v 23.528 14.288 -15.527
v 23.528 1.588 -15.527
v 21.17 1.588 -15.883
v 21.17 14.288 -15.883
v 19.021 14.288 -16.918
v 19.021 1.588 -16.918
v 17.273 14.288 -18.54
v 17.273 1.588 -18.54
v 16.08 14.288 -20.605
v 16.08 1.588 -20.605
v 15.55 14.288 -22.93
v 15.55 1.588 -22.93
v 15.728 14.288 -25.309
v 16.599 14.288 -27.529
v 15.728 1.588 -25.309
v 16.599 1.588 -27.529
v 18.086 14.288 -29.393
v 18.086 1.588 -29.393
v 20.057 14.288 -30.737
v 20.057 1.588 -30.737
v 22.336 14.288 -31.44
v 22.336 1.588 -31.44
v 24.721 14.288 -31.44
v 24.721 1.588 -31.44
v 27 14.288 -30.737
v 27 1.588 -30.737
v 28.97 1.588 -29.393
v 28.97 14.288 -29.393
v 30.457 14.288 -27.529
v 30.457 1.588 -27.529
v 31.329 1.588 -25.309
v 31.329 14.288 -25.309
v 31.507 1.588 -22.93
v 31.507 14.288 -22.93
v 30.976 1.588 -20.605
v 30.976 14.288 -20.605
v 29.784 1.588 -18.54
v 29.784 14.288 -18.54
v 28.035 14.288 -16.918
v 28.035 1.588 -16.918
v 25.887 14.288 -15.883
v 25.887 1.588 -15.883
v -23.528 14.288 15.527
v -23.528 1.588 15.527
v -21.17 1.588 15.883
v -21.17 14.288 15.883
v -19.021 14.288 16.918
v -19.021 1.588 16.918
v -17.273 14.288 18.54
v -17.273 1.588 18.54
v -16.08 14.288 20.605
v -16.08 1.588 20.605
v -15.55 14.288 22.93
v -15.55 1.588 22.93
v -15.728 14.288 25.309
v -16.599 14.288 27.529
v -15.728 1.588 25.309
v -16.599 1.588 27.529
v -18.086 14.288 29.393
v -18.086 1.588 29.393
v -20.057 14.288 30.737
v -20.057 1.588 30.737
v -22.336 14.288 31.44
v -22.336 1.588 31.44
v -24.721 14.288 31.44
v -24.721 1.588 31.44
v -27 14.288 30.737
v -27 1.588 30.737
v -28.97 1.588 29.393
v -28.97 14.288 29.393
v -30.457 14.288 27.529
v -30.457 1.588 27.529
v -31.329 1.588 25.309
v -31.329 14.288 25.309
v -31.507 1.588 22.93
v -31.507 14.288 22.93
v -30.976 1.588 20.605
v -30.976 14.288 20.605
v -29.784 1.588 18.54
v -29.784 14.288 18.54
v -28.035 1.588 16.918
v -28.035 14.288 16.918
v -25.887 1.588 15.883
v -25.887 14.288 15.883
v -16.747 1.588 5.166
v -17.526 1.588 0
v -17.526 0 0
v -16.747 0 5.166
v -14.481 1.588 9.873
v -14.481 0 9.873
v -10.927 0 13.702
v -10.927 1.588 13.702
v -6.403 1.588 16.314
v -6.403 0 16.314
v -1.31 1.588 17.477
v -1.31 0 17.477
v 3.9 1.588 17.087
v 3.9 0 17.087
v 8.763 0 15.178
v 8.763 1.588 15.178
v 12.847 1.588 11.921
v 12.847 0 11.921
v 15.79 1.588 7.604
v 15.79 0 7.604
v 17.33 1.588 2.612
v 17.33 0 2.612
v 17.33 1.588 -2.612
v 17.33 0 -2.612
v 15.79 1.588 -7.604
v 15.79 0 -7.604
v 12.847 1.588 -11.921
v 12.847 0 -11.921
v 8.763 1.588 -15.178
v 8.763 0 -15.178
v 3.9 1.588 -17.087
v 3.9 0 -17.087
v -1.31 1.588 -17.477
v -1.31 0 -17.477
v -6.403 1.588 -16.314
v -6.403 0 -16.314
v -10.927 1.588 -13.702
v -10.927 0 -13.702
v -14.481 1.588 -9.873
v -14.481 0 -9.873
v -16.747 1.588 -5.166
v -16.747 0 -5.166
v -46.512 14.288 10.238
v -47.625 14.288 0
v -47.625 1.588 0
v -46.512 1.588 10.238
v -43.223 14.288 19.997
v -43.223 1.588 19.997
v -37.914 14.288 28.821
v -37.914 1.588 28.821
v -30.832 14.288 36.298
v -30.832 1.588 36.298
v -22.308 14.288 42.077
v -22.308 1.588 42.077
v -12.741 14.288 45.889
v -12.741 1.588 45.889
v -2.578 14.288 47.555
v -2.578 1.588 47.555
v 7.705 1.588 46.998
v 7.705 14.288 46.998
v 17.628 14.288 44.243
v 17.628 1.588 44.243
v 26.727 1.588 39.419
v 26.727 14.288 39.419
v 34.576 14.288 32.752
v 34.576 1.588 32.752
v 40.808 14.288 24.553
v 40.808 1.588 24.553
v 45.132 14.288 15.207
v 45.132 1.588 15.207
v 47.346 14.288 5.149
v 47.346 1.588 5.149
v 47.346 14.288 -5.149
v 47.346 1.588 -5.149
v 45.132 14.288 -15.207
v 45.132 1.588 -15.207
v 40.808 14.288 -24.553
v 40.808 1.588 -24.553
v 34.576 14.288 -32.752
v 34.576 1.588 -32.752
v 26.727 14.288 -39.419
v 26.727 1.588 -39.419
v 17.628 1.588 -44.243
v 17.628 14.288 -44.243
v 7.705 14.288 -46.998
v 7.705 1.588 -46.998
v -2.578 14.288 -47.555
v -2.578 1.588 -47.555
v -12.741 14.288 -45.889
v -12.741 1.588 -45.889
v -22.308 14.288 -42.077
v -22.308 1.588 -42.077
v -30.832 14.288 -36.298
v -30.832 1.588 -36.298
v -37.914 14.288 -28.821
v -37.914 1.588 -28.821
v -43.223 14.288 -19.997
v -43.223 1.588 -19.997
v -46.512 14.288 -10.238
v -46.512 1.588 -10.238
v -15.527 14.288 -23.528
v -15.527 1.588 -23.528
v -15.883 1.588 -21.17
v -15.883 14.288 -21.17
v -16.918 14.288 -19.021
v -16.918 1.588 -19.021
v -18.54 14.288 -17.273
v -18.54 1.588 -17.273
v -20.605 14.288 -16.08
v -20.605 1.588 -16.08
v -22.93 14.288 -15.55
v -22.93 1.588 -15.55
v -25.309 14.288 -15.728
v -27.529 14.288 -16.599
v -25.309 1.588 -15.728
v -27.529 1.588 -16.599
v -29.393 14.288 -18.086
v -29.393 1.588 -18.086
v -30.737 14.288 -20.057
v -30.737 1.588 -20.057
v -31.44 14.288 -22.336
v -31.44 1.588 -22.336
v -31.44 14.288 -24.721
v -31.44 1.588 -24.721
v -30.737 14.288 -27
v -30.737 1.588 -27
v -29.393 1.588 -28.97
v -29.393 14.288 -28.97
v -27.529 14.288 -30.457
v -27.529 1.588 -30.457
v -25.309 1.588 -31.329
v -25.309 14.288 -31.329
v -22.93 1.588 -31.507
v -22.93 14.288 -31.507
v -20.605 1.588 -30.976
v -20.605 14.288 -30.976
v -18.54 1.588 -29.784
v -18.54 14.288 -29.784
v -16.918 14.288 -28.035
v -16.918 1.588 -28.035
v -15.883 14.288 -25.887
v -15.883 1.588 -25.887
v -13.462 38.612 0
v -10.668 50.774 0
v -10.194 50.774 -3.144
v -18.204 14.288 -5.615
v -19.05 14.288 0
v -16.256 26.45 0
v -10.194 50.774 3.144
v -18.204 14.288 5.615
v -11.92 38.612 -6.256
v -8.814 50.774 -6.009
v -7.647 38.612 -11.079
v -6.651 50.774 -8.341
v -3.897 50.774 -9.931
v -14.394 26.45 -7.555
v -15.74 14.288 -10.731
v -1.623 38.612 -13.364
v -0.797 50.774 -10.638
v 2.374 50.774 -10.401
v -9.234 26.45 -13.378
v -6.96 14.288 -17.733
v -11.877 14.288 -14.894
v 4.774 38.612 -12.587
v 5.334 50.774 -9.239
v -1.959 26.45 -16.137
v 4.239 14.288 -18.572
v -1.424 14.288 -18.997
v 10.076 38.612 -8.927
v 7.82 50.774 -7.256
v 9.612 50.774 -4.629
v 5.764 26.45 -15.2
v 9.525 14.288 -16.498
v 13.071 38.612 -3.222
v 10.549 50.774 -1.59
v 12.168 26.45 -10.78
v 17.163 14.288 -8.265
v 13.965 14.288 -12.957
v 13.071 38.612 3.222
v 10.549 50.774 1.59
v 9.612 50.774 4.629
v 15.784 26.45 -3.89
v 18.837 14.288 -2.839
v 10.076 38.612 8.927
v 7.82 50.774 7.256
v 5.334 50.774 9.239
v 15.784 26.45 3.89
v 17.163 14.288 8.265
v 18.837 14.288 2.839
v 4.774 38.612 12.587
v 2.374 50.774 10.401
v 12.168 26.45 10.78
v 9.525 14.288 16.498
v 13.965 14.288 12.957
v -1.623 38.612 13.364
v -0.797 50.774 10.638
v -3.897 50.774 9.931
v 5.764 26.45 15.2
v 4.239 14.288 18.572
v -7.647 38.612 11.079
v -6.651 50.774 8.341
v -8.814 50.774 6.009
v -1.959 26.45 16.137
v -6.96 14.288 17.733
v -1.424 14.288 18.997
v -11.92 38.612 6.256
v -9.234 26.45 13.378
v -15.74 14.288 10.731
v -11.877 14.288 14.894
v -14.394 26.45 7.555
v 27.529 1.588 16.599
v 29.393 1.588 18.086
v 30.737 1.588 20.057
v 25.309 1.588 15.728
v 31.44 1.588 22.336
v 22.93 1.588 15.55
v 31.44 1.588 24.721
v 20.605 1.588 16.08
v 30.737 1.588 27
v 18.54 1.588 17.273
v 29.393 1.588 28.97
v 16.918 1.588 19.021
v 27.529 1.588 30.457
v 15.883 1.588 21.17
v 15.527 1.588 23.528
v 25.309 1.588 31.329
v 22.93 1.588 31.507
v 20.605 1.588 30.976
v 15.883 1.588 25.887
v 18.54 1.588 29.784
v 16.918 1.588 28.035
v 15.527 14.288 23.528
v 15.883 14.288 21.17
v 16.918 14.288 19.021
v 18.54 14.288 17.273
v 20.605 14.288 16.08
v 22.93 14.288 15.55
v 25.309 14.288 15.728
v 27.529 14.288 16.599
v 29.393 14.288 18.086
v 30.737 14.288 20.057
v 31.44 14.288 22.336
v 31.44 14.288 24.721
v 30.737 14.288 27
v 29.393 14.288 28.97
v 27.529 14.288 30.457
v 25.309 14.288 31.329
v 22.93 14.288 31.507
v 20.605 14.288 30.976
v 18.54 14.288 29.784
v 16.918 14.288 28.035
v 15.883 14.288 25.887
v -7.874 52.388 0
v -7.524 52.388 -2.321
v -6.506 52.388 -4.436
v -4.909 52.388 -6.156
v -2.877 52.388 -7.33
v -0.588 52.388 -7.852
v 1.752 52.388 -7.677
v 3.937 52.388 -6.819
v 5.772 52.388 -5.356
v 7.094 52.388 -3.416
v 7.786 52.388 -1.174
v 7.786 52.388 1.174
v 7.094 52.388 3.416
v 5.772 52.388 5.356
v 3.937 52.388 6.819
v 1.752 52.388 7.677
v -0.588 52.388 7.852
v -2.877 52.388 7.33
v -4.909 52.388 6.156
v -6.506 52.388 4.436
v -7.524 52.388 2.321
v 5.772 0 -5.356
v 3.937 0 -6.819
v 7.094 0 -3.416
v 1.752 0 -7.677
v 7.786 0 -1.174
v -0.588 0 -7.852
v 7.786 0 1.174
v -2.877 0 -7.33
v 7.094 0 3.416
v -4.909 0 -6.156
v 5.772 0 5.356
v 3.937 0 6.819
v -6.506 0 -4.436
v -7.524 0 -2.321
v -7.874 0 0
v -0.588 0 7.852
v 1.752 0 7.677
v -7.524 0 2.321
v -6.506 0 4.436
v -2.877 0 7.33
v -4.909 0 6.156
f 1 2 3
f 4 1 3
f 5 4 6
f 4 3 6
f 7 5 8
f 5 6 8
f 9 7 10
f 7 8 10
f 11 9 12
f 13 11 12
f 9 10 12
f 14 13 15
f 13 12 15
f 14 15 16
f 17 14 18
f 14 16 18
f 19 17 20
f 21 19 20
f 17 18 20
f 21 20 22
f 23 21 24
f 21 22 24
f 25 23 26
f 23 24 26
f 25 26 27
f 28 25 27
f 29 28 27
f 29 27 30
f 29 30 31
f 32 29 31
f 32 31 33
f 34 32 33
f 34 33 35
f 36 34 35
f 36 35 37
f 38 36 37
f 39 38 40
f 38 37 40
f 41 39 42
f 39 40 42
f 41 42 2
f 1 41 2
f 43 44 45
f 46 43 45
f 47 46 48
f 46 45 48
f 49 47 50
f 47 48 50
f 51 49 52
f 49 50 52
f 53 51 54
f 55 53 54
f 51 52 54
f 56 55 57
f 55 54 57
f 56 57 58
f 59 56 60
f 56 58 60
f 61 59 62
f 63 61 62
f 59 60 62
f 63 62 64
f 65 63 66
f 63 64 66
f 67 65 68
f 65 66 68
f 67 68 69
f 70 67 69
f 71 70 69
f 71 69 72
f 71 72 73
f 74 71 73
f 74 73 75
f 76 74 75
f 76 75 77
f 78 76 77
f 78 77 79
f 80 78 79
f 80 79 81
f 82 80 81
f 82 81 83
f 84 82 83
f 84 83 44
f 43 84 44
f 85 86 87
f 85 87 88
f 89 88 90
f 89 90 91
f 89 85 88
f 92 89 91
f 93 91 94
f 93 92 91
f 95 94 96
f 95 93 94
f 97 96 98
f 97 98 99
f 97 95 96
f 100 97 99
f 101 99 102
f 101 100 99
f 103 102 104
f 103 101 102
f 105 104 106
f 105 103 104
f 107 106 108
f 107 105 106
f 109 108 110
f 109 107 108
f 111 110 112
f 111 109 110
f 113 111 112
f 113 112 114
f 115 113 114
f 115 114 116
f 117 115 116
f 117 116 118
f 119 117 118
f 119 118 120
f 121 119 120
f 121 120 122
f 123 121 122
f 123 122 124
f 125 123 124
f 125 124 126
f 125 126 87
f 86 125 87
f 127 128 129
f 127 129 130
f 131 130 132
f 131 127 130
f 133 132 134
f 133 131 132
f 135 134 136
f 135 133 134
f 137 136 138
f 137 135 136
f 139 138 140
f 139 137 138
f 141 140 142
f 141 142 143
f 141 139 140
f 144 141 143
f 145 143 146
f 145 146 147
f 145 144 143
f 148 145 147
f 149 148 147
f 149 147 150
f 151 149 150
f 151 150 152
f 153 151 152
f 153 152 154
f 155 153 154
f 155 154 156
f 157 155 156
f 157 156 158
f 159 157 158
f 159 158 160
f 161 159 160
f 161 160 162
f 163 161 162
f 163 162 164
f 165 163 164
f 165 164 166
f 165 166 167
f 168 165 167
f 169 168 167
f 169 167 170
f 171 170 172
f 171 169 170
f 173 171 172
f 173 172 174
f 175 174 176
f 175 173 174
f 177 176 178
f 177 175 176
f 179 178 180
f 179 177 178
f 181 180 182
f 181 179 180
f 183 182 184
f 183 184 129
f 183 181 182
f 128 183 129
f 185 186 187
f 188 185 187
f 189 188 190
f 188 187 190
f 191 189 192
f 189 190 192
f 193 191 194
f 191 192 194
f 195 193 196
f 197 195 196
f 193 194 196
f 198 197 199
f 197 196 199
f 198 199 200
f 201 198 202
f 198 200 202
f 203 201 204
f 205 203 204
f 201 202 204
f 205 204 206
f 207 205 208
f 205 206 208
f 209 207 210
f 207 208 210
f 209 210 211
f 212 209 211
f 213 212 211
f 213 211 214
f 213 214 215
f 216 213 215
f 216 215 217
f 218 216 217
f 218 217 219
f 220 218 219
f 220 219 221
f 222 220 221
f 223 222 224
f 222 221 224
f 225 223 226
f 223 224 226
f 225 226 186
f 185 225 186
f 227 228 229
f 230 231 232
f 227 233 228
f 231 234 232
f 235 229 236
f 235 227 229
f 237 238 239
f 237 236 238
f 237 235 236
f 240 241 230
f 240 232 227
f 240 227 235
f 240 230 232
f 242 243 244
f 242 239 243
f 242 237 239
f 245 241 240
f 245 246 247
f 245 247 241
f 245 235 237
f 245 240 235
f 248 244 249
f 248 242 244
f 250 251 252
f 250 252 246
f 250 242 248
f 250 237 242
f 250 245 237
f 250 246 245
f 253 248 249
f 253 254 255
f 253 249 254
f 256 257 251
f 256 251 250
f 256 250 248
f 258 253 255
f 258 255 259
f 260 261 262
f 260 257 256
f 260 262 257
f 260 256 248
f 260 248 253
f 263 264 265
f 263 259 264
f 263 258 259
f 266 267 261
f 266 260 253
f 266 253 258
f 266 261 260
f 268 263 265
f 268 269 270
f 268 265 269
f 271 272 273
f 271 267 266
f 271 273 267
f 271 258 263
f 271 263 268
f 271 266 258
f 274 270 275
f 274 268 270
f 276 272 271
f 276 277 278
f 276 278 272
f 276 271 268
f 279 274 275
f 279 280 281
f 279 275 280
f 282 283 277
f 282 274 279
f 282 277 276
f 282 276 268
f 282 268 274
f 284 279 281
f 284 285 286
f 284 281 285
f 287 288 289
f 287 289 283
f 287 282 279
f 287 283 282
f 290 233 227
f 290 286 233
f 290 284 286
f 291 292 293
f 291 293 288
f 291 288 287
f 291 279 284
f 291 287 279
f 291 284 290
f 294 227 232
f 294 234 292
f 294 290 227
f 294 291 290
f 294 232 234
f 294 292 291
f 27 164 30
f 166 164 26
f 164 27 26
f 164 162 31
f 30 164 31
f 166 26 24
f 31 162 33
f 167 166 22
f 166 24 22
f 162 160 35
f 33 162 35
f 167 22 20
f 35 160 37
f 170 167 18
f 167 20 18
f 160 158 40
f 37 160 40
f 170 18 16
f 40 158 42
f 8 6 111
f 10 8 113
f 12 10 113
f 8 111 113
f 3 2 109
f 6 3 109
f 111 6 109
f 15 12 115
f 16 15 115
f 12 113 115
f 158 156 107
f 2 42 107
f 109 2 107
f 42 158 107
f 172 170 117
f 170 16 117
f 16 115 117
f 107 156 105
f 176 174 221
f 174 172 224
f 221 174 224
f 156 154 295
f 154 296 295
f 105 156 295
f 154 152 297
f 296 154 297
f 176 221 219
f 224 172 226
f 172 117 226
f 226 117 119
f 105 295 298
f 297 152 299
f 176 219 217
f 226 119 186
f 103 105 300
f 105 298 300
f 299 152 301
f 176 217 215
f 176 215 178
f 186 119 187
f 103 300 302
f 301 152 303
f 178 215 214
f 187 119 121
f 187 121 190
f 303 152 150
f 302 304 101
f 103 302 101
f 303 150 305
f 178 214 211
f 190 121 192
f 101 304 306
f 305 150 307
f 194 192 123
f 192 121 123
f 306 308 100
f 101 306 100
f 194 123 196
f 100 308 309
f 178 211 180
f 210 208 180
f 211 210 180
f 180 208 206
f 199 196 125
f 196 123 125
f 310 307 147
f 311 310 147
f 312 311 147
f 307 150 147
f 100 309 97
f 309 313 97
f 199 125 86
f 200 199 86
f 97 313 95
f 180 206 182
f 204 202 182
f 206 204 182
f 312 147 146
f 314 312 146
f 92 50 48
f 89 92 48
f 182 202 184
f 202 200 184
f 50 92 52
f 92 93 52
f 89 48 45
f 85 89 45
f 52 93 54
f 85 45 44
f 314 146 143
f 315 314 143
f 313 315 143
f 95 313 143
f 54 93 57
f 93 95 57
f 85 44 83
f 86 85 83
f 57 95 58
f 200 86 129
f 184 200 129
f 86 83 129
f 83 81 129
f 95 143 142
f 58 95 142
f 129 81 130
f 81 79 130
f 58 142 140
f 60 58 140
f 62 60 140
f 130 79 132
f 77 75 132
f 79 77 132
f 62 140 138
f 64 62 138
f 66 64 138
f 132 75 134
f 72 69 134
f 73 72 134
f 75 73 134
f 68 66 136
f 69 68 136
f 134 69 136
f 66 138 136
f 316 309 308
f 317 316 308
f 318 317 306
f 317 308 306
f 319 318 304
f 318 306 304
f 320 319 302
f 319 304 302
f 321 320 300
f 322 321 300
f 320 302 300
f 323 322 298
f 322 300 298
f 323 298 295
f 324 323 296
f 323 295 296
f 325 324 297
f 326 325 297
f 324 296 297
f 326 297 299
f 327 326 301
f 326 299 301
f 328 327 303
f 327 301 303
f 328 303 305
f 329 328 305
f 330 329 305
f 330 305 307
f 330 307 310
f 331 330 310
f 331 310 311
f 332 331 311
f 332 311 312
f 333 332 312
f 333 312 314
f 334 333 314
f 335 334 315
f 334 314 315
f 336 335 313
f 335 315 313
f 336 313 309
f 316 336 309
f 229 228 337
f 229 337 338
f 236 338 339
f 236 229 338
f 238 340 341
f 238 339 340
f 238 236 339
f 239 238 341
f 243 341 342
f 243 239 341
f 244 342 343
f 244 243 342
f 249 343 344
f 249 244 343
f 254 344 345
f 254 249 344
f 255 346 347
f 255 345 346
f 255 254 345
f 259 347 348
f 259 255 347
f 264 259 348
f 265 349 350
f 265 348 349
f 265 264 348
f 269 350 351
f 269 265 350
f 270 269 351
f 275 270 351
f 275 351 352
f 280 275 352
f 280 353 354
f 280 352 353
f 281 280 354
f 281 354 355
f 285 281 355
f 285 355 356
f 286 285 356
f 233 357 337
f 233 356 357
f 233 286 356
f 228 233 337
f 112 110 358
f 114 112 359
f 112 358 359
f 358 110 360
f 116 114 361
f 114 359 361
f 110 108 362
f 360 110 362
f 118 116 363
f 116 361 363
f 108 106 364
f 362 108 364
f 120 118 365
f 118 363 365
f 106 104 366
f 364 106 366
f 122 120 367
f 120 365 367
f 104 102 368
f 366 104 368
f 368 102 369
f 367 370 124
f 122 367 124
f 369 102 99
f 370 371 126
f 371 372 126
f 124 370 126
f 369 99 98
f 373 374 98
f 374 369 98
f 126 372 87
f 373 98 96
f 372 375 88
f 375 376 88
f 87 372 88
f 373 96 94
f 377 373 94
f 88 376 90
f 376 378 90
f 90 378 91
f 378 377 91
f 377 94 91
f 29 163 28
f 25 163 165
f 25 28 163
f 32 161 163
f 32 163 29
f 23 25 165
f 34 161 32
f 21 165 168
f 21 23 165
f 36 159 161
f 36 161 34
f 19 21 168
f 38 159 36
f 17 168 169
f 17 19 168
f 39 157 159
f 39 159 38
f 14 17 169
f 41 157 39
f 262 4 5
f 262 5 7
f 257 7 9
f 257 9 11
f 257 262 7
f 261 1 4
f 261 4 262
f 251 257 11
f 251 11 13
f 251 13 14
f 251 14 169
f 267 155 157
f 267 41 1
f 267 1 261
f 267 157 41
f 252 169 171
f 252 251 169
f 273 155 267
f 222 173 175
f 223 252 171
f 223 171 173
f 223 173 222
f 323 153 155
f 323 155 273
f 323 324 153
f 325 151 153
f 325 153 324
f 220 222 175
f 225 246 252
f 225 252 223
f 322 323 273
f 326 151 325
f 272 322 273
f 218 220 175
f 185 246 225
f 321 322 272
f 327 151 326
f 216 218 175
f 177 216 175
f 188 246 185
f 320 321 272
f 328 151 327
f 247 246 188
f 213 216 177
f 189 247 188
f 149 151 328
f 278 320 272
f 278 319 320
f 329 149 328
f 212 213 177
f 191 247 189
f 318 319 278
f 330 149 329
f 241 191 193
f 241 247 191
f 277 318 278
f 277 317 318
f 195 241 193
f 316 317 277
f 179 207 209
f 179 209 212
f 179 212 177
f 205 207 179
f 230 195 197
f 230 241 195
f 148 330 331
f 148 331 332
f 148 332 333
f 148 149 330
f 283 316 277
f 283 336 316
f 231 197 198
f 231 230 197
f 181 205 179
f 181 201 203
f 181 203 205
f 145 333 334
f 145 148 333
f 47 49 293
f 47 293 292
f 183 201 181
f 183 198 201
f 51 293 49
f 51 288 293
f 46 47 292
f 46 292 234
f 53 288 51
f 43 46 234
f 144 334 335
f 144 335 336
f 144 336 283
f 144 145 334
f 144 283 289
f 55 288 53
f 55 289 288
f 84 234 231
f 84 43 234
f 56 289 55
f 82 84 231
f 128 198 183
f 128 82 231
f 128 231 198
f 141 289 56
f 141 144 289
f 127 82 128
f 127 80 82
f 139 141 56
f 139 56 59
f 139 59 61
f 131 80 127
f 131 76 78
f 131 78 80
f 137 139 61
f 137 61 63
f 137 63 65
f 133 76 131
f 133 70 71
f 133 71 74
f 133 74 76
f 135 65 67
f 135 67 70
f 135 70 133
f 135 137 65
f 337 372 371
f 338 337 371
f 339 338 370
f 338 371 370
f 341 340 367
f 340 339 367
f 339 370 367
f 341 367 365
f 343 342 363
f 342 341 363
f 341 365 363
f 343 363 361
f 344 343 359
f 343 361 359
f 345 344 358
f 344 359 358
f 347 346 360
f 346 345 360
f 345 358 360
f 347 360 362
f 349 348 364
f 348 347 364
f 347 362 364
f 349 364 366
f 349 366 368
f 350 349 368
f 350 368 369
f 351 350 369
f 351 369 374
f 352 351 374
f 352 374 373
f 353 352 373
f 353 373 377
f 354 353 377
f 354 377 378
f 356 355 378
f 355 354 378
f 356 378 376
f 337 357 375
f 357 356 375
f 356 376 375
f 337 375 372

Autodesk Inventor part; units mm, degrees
ref_plane "YZ Plane" through (0, 0, 0) normal (1, 0, 0) x (0, 1, 0)
ref_plane "XZ Plane" through (0, 0, 0) normal (0, 1, 0) x (-1, 0, 0)
ref_plane "XY Plane" through (0, 0, 0) normal (0, 0, 1) x (1, 0, 0)
sketch "Sketch1" plane through (0, 0, 0) normal (0, 0, 1) x (1, 0, 0)
  line L0 (0, 0) -> (0, 52.3875) construction
  line L1 (-7.874, 52.3875) -> (-7.874, 0)
  line L2 (-7.874, 0) -> (-17.526, 0)
  line L3 (-17.526, 0) -> (-17.526, 1.5875)
  line L4 (-17.526, 1.5875) -> (-47.625, 1.5875)
  line L5 (-47.625, 1.5875) -> (-47.625, 14.2875)
  line L6 (-47.625, 14.2875) -> (-19.05, 14.2875)
  line L7 (-19.05, 14.2875) -> (-10.668, 50.7744)
  line L8 (-10.668, 50.7744) -> (-7.874, 52.3875)
  line L9 (-33.274, 14.2875) -> (-33.274, 1.5875) construction
  dimension "WB" = 15.748
  dimension "d1" = 1.5875
  dimension "WL" = 50.8
  dimension "Thickness" = 12.7
  dimension "R" = 35.052
  dimension "OD" = 95.25
  dimension "HB" = 38.1
  dimension "HT" = 21.336
  dimension "d8" = 60
  dimension "BC" = 66.548
revolve "Revolution1" add sketch "Sketch1" angle 360 about axis through (0, 0, 0) along (0, 1, 0)
sketch "Sketch2" plane through (0, 14.2875, 0) normal (0, 1, 0) x (1, 0, 0)
  line L0 (0, 0) -> (0, 47.625) construction
  circle A0 centre (0, 0) radius 47.625 projected
  line L1 (0, 0) -> (23.5283, 23.5283) construction
  dimension "d11" = 45
  dimension "d12" = 33.274
hole "Hole1" at (23.5283, 14.2875, -23.5283) direction (0, -1, 0) diameter 16.002 depth 12.7
pattern_circular "Circular Pattern1" count 4 over 360 about axis through (0, -10, 0) along (0, 1, 0) of "Hole1"
equation "\"d12\" = 0.5 * BC"
properties part number "ANSI-B300-0.5W"
